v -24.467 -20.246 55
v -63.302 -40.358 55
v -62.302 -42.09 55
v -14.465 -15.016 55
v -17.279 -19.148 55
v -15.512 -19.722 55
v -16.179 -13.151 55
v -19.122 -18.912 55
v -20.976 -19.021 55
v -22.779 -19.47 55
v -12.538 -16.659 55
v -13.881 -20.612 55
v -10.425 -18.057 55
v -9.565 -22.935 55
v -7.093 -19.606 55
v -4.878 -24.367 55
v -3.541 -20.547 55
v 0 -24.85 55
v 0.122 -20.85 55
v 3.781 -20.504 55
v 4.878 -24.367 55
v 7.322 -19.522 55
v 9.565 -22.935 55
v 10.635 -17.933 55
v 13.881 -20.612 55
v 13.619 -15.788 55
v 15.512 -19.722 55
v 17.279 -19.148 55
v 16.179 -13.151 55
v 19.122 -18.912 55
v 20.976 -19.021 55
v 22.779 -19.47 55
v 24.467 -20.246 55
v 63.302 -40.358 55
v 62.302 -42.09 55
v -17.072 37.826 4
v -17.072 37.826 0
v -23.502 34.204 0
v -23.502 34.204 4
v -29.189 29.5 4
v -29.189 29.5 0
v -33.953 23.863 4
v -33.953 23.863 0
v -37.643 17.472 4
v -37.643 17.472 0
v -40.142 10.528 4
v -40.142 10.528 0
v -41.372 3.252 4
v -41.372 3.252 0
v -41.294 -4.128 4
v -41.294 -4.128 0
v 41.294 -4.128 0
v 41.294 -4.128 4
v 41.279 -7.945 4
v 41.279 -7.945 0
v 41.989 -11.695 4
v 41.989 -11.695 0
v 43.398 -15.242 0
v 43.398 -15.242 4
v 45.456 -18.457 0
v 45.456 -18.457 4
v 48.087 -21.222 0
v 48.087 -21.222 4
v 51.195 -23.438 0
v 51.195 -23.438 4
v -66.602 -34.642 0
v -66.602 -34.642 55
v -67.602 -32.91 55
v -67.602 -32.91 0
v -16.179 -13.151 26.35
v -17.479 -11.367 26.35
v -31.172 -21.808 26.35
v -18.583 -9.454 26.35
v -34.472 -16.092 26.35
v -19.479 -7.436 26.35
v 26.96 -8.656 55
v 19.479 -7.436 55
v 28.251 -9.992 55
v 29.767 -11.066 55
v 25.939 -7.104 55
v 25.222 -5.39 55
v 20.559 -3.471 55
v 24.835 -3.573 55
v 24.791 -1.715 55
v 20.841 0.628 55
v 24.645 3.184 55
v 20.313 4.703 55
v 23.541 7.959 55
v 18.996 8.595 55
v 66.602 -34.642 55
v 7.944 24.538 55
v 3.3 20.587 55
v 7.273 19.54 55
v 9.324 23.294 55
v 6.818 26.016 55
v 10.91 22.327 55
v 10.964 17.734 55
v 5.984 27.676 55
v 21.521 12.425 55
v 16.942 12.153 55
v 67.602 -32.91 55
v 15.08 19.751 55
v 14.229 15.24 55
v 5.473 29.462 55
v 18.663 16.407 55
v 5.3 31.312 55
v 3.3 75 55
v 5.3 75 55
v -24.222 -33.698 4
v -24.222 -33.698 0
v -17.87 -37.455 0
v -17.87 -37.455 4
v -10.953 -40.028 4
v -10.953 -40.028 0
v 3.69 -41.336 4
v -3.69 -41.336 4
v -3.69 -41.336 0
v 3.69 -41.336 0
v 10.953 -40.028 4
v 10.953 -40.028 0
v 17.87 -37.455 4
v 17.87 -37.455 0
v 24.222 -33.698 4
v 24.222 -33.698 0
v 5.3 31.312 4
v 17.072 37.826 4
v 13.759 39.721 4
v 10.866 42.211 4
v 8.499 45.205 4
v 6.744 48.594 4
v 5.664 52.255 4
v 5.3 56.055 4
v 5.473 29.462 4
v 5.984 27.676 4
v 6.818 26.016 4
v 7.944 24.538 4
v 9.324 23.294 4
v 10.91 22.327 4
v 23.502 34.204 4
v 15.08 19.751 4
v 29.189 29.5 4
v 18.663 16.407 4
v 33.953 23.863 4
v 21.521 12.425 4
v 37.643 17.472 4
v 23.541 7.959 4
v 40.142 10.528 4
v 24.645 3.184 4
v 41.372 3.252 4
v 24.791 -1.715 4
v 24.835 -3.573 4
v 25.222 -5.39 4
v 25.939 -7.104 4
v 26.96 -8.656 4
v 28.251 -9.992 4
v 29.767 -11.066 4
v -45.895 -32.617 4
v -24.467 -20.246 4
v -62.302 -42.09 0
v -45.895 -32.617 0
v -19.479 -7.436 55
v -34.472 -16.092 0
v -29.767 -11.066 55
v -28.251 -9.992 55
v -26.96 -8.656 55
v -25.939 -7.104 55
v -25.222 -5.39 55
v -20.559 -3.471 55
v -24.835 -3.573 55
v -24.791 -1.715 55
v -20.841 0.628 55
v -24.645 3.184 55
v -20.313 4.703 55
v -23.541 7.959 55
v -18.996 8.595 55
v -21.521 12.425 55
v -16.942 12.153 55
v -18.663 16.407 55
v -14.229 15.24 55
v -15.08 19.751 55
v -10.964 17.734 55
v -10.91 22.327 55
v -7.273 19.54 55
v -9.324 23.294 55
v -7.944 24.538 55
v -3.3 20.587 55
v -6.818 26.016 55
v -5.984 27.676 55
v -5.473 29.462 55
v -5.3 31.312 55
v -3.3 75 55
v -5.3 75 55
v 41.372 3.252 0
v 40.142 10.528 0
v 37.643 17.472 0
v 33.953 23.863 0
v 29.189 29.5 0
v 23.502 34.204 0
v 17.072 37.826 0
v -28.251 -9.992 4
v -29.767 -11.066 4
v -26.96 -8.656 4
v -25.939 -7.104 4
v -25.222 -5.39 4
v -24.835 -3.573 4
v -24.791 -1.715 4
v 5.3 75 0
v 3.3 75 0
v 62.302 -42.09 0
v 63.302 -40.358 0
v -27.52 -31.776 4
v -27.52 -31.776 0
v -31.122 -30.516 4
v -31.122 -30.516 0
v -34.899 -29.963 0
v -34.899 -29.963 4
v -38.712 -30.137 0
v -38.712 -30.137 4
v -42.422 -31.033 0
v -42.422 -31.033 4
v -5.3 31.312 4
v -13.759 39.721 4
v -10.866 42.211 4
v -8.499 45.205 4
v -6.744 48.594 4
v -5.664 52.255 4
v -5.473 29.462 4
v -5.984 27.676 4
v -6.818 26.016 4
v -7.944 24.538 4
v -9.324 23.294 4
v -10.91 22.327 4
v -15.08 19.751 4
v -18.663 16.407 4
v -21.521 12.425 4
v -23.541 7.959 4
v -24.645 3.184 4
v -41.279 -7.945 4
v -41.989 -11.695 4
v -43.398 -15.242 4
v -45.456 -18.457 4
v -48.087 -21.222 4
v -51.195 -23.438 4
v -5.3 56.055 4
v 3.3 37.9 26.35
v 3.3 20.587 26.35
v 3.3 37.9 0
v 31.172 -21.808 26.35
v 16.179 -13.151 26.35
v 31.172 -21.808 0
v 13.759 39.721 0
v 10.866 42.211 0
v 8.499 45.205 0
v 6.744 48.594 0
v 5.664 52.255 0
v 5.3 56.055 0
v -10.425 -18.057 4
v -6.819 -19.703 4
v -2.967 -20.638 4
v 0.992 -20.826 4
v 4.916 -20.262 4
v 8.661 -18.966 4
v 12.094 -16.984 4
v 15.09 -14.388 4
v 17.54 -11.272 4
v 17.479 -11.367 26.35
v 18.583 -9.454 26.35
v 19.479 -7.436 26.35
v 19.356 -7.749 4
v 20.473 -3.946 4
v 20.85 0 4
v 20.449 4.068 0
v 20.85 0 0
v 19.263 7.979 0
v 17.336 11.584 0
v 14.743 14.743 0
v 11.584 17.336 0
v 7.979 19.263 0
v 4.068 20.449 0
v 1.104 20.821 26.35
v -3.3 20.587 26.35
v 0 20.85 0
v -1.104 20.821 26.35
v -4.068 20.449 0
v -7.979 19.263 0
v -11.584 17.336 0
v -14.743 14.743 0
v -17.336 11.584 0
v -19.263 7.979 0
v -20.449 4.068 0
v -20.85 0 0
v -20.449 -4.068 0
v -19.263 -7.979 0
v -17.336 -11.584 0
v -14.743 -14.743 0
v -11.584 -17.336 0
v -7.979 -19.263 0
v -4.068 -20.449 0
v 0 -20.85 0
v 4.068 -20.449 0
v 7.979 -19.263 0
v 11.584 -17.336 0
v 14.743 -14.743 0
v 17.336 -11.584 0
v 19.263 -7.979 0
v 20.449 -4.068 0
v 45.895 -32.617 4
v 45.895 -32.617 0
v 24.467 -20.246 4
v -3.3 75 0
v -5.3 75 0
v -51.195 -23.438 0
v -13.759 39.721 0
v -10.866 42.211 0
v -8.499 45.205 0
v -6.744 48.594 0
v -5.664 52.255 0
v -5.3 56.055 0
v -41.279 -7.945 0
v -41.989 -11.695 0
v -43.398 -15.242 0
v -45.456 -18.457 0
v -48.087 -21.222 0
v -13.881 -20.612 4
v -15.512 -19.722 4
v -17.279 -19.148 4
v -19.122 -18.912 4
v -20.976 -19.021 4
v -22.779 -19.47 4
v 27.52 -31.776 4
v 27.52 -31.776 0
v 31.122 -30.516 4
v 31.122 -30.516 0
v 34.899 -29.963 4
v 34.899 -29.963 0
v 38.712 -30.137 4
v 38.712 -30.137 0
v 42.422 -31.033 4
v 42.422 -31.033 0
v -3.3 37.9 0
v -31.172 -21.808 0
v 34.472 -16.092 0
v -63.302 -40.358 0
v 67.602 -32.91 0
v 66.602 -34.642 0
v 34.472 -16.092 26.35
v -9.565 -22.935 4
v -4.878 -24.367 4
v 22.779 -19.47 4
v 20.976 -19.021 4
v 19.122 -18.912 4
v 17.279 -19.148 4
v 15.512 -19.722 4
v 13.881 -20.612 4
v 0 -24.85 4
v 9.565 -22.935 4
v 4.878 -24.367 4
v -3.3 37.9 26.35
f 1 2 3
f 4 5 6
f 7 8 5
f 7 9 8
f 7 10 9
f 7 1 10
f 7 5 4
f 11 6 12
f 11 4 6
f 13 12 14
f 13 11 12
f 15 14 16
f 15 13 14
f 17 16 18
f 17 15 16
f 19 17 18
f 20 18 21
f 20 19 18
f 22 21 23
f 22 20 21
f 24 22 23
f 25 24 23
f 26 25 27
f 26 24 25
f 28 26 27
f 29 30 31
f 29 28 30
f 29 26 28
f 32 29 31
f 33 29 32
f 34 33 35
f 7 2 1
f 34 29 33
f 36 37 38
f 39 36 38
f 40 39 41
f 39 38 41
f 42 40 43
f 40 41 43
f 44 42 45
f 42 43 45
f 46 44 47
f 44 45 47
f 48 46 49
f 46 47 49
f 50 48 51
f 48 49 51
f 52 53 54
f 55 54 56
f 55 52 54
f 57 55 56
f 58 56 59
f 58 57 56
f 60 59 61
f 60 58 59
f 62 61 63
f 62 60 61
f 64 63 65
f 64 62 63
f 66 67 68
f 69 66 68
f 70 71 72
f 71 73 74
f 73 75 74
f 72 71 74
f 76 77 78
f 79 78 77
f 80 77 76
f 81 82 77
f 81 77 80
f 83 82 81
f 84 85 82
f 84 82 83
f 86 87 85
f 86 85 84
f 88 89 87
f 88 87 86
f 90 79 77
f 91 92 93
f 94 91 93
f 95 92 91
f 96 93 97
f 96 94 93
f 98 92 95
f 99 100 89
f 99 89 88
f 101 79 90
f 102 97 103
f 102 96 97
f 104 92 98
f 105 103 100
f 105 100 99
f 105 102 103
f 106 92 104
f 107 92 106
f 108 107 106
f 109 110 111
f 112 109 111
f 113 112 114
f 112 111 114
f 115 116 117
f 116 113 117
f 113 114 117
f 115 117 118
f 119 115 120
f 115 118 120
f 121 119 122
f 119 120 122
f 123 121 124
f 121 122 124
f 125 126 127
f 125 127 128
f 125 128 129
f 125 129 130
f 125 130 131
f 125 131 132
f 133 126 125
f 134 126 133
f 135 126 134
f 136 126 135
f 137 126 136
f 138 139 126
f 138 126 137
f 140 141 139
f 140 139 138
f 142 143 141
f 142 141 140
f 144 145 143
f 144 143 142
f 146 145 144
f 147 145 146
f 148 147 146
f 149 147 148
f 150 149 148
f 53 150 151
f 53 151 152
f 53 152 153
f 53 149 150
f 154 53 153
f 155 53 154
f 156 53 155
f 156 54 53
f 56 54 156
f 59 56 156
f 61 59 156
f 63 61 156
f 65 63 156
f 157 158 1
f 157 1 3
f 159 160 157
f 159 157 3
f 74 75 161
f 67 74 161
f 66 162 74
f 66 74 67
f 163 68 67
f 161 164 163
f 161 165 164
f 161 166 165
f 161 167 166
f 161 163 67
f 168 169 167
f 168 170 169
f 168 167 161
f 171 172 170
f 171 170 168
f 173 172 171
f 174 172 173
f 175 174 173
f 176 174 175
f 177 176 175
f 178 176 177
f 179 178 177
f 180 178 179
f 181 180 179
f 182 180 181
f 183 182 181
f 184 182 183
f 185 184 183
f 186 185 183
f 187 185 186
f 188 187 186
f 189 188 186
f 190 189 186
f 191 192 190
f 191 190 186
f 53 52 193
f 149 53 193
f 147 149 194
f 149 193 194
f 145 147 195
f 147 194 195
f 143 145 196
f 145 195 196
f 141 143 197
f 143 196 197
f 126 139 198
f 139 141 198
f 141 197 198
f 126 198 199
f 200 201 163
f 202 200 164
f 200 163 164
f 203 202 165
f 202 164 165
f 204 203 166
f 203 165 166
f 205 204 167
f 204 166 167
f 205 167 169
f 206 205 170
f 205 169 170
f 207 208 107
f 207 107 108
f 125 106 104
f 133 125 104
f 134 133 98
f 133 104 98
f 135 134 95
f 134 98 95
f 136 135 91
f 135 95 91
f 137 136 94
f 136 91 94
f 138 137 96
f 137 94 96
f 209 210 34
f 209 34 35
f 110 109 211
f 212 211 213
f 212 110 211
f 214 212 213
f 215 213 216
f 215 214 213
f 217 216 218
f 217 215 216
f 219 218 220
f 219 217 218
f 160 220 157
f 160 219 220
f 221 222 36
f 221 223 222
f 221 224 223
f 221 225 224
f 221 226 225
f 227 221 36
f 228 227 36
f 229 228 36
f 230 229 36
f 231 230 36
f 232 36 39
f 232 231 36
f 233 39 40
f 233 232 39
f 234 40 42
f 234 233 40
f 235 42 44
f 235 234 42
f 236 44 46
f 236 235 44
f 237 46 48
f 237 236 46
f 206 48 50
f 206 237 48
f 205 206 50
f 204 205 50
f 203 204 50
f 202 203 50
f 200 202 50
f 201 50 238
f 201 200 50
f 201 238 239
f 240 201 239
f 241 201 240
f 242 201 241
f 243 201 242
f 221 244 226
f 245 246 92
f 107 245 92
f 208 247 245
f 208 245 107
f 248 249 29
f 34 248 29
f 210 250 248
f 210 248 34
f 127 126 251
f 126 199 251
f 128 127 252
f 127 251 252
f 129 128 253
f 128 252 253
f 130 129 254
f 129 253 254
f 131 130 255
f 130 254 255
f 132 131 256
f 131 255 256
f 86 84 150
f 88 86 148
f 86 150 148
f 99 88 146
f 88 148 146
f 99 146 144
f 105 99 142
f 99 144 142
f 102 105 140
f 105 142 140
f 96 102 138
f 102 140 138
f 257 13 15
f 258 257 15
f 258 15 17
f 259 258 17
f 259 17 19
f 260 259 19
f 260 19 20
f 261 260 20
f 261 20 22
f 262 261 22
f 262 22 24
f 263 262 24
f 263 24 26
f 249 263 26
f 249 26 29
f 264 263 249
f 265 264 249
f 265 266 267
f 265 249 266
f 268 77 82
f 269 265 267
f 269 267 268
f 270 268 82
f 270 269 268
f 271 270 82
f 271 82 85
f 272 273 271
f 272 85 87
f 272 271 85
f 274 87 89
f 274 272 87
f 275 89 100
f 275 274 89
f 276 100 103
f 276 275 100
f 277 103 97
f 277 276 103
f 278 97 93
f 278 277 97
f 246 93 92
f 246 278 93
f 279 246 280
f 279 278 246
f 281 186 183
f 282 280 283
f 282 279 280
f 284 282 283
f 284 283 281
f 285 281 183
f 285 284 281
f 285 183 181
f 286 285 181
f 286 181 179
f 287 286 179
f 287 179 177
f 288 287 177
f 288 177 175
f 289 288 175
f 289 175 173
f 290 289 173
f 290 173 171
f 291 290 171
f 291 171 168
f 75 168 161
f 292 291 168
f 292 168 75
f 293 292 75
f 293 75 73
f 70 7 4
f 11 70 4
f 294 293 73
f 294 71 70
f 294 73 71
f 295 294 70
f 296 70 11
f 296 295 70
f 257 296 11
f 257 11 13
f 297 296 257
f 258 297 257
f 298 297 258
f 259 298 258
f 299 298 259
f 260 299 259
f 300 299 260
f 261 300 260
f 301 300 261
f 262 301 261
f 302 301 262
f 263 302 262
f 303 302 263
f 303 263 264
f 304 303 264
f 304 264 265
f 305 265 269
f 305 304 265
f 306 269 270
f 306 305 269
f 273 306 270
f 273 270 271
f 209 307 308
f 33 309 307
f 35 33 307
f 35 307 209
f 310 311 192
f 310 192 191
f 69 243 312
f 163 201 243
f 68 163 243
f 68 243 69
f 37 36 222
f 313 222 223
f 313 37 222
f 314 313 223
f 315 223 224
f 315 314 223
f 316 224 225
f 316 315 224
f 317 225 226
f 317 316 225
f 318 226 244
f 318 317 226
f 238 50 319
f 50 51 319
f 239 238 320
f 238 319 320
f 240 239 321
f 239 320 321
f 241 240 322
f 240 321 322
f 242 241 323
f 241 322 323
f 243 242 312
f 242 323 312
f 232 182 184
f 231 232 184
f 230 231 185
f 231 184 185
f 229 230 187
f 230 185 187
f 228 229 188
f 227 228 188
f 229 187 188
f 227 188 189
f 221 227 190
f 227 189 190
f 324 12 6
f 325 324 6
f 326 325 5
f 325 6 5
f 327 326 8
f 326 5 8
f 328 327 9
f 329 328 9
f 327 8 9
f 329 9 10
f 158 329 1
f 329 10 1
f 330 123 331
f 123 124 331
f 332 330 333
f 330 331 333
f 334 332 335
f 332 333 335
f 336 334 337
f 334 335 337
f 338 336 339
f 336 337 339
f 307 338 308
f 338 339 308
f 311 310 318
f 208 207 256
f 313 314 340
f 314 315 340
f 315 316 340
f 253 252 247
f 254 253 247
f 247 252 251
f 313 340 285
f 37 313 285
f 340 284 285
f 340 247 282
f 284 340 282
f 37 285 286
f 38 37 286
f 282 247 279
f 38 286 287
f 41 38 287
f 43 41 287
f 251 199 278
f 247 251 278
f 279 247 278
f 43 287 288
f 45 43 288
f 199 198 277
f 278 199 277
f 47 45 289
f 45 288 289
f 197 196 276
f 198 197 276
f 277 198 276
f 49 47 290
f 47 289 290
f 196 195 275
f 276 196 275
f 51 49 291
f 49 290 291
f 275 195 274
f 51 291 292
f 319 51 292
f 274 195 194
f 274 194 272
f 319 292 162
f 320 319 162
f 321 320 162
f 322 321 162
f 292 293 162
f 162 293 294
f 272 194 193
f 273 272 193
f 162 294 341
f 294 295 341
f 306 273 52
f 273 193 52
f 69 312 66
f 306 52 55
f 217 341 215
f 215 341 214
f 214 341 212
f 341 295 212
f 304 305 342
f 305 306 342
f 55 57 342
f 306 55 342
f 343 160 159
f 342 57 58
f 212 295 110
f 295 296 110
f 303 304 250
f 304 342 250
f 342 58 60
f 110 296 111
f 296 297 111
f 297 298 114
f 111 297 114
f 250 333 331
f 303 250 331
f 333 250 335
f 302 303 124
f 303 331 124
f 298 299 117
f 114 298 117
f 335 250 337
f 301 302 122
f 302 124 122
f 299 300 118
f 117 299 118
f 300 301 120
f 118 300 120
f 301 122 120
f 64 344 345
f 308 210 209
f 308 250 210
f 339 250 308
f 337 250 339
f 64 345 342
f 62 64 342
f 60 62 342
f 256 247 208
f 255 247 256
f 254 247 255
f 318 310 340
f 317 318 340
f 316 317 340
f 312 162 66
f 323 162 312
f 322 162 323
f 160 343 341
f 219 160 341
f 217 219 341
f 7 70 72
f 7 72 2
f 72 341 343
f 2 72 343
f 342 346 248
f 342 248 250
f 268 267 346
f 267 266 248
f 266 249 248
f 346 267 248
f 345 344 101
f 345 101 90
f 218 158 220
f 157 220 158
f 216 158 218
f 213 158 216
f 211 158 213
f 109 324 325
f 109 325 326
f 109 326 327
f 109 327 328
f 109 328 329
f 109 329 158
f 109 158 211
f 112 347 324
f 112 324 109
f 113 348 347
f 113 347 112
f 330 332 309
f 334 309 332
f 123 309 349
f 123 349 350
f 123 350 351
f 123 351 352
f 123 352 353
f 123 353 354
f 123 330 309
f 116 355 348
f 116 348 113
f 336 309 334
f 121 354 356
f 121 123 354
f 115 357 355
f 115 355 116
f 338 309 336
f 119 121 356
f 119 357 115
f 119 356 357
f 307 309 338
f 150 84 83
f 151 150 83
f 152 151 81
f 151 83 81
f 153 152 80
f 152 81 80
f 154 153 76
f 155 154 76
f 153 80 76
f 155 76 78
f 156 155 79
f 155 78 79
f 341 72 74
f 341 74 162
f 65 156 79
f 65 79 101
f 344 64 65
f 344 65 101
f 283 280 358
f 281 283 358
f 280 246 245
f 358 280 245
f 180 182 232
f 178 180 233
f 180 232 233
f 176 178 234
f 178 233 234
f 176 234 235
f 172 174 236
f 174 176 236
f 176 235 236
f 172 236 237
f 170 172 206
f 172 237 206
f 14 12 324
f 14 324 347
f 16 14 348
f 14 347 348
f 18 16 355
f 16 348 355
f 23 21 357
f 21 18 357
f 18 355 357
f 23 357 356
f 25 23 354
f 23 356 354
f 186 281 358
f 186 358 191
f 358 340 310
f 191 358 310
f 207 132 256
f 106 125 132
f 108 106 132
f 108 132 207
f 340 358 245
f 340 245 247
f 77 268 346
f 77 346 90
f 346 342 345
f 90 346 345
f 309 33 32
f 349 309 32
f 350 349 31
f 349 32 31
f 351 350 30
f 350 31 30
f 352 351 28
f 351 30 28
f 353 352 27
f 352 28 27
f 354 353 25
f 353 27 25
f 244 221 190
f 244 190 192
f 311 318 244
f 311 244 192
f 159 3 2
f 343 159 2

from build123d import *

# Parameters (mm, degrees)
SKETCH1_R                       = 20.75
BOSS_EXTRUDE1_DEPTH             = 100
BOSS_EXTRUDE2_DEPTH             = 3.2
THICKEN1_OUTLINE_R              = 24.85
THICKEN1_OUTLINE_R_2            = 20.85
THICKEN1_DEPTH                  = 100
THICKEN2_START                  = 26.35
THICKEN2_DEPTH                  = 73.65
THICKEN2_2_OUTLINE_W            = 2
THICKEN2_2_OUTLINE_H            = 37
THICKEN2_2_DEPTH                = 26.35
THICKEN3_START                  = 26.35
THICKEN3_DEPTH                  = 73.65
THICKEN3_2_OUTLINE_W            = 2
THICKEN3_2_OUTLINE_H            = 37
THICKEN3_2_DEPTH                = 26.35
BOSS_EXTRUDE4_REACH             = 129.446
SKETCH4_W                       = 26.35
SKETCH4_H                       = 17.15
BOSS_EXTRUDE4_DIRECTION_2_REACH = 129.446
FILLET1_R                       = 10
SKETCH3_R                       = 41.5
BOSS_EXTRUDE3_DEPTH             = 4
FILLET2_R                       = 20
CIRPATTERN4_COUNT               = 3
MOVE_FACE3_BY                   = 0.1
MOVE_FACE4_BY                   = 0.1
MOVE_FACE4_2_BY                 = 0.1
MOVE_FACE4_3_BY                 = 0.1
MOVE_START                      = 26.35
MOVE_FACE5_OUTLINE_W            = 6.6
MOVE_FACE5_OUTLINE_H            = 20.75
MOVE_FACE5_DEPTH                = 73.65
CIRPATTERN1_COUNT               = 3
SKETCH5_R                       = 108.755446709
CUT_EXTRUDE1_DEPTH              = 45


with BuildPart() as part:
    # Sketch1 → Boss-Extrude1 (new body)
    with BuildSketch(Plane.XY):
        Circle(SKETCH1_R)
    extrude(amount=BOSS_EXTRUDE1_DEPTH)

    # Move Face3: a curved face moved outward by 0.1
    add(Solid.thicken(part.faces().sort_by_distance((-20.75, 0, 50))[0], MOVE_FACE3_BY))


with BuildPart() as body_2:
    # Sketch2 → Boss-Extrude2 (new, symmetric)
    with BuildSketch(Plane(origin=(0, 0, 0), x_dir=(0, 0, -1), z_dir=(1, 0, 0))):
        Polygon((-26.35, 20.75), (-26.35, 38), (0, 38), (0, 75), (-100, 75), (-100, 20.75), align=None)
    extrude(amount=BOSS_EXTRUDE2_DEPTH, both=True)

    # Move Face4: a face moved outward by 0.1
    extrude(body_2.faces().sort_by_distance((0, 38, 13.175))[0], amount=MOVE_FACE4_BY, dir=(0, -1, 0))

    # Move Face4 2: a face moved outward by 0.1
    extrude(body_2.faces().sort_by_distance((-3.2, 49.566782958, 53.367562563))[0], amount=MOVE_FACE4_2_BY, dir=(-1, 0, 0))

    # Move Face4 3: a face moved outward by 0.1
    extrude(body_2.faces().sort_by_distance((3.2, 49.566782958, 53.367562563))[0], amount=MOVE_FACE4_3_BY, dir=(1, 0, 0))

    # Move Face5: read off the stored shape, not the designer's step
    # Move Face5 outline → Move Face5 (add)
    with BuildSketch(Plane.XY.offset(MOVE_START)):
        with Locations((0, 10.375)):
            Rectangle(MOVE_FACE5_OUTLINE_W, MOVE_FACE5_OUTLINE_H)
    extrude(amount=MOVE_FACE5_DEPTH)


with BuildPart() as body_3:
    # Thicken1: read off the stored shape, not the designer's step
    # Thicken1 outline → Thicken1 (new body)
    with BuildSketch(Plane.XY):
        Circle(THICKEN1_OUTLINE_R)
        Circle(THICKEN1_OUTLINE_R_2, mode=Mode.SUBTRACT)
    extrude(amount=THICKEN1_DEPTH)

    # Thicken2: read off the stored shape, not the designer's step
    # Thicken2 outline → Thicken2 (add)
    with BuildSketch(Plane.XY.offset(THICKEN2_START)):
        with BuildLine():
            ThreePointArc((-5.3, 24.27823099), (-4.303593806, 24.474508787), (-3.3, 24.629910678))
            Line((-3.3, 24.629910678), (-3.3, 75))
            Line((-3.3, 75), (-5.3, 75))
            Line((-5.3, 75), (-5.3, 24.27823099))
        make_face()
    extrude(amount=THICKEN2_DEPTH)

    # Thicken2 2 outline → Thicken2 2 (add)
    with BuildSketch(Plane.XY):
        with Locations((-4.3, 56.5)):
            Rectangle(THICKEN2_2_OUTLINE_W, THICKEN2_2_OUTLINE_H)
    extrude(amount=THICKEN2_2_DEPTH)

    # Thicken3: read off the stored shape, not the designer's step
    # Thicken3 outline → Thicken3 (add)
    with BuildSketch(Plane.XY.offset(THICKEN3_START)):
        with BuildLine():
            Line((3.3, 75), (3.3, 24.629910678))
            ThreePointArc((3.3, 24.629910678), (4.303593806, 24.474508787), (5.3, 24.27823099))
            Line((5.3, 24.27823099), (5.3, 75))
            Line((5.3, 75), (3.3, 75))
        make_face()
    extrude(amount=THICKEN3_DEPTH)

    # Thicken3 2 outline → Thicken3 2 (add)
    with BuildSketch(Plane.XY):
        with Locations((4.3, 56.5)):
            Rectangle(THICKEN3_2_OUTLINE_W, THICKEN3_2_OUTLINE_H)
    extrude(amount=THICKEN3_2_DEPTH)

    # Boss-Extrude4: up to this face of the body (flat: up to its plane)
    boss_extrude4_end = Plane(body_3.part.faces().sort_by_distance((5.3, 51.059106065, 52.826548797))[0])
    # Sketch4 → Boss-Extrude4 (add, up to the picked face)
    with BuildSketch(Plane(origin=(0, 0, 0), x_dir=(0, 0, -1), z_dir=(1, 0, 0)), mode=Mode.PRIVATE) as boss_extrude4_sk1:
        with Locations((-13.175, 29.425)):
            Rectangle(SKETCH4_W, SKETCH4_H)
    boss_extrude4_tool1 = split(extrude(boss_extrude4_sk1.sketch, amount=BOSS_EXTRUDE4_REACH, mode=Mode.PRIVATE), bisect_by=boss_extrude4_end, keep=Keep.BOTH, mode=Mode.PRIVATE)
    add(boss_extrude4_tool1.solids().sort_by(Axis((0, 29.425, 13.175), (1, 0, 0)))[0])

    # Boss-Extrude4 direction 2: up to this face of the body (flat: up to its plane)
    boss_extrude4_direction_2_end = Plane(body_3.part.faces().sort_by_distance((-5.3, 51.059106065, 52.826548797))[0])
    # Sketch4 → Boss-Extrude4 direction 2 (add, up to the picked face)
    with BuildSketch(Plane(origin=(0, 0, 0), x_dir=(0, 0, -1), z_dir=(1, 0, 0)), mode=Mode.PRIVATE) as boss_extrude4_direction_2_sk1:
        with Locations((-13.175, 29.425)):
            Rectangle(SKETCH4_W, SKETCH4_H)
    boss_extrude4_direction_2_tool1 = split(extrude(boss_extrude4_direction_2_sk1.sketch, amount=-BOSS_EXTRUDE4_DIRECTION_2_REACH, mode=Mode.PRIVATE), bisect_by=boss_extrude4_direction_2_end, keep=Keep.BOTH, mode=Mode.PRIVATE)
    add(boss_extrude4_direction_2_tool1.solids().sort_by(Axis((0, 29.425, 13.175), (-1, 0, 0)))[0])

    # Fillet1
    fillet1_edges = [body_3.edges().sort_by_distance(p)[0] for p in [
        (-5.3, 24.27823099, 50),
        (5.3, 24.27823099, 50),
    ]]
    fillet(fillet1_edges, radius=FILLET1_R)

    # Sketch3 → Boss-Extrude3 (add)
    with BuildSketch(Plane.XY):
        Circle(SKETCH3_R)
    extrude(amount=BOSS_EXTRUDE3_DEPTH)

    # Fillet2
    fillet2_edges = [body_3.edges().sort_by_distance(p)[0] for p in [
        (-5.3, 41.160174927, 2),
        (5.3, 41.160174927, 2),
    ]]
    fillet(fillet2_edges, radius=FILLET2_R)


with BuildPart() as cirpattern4_1:
    # CirPattern4: pattern copy
    add(body_3.part.rotate(Axis((0, 0, 0), (0, 0, 1)), 1 * 360 / CIRPATTERN4_COUNT))


with BuildPart() as cirpattern4_2:
    # CirPattern4: pattern copy
    add(body_3.part.rotate(Axis((0, 0, 0), (0, 0, 1)), 2 * 360 / CIRPATTERN4_COUNT))

    # Combine2: read off the stored shape, not the designer's step
    # Combine2: union CirPattern4_1, body 3
    add(cirpattern4_1.part)
    add(body_3.part)


with BuildPart() as cirpattern1_1:
    # CirPattern1: pattern copy
    add(body_2.part.rotate(Axis((0, 0, 0), (0, 0, 1)), 1 * 360 / CIRPATTERN1_COUNT))


with BuildPart() as cirpattern1_2:
    # CirPattern1: pattern copy
    add(body_2.part.rotate(Axis((0, 0, 0), (0, 0, 1)), 2 * 360 / CIRPATTERN1_COUNT))


with BuildPart() as cirpattern4_2_1:
    add(cirpattern4_2.part)

    # Combine3: read off the stored shape, not the designer's step
    # Combine3: cut CirPattern1_2, CirPattern1_1, body 2, part
    add(cirpattern1_2.part, mode=Mode.SUBTRACT)
    add(cirpattern1_1.part, mode=Mode.SUBTRACT)
    add(body_2.part, mode=Mode.SUBTRACT)
    add(part.part, mode=Mode.SUBTRACT)

    # Sketch5 → Cut-Extrude1 (cut)
    with BuildSketch(Plane.XY.offset(100)):
        Circle(SKETCH5_R)
    extrude(amount=-CUT_EXTRUDE1_DEPTH, mode=Mode.SUBTRACT)


solid = cirpattern4_2_1.part
